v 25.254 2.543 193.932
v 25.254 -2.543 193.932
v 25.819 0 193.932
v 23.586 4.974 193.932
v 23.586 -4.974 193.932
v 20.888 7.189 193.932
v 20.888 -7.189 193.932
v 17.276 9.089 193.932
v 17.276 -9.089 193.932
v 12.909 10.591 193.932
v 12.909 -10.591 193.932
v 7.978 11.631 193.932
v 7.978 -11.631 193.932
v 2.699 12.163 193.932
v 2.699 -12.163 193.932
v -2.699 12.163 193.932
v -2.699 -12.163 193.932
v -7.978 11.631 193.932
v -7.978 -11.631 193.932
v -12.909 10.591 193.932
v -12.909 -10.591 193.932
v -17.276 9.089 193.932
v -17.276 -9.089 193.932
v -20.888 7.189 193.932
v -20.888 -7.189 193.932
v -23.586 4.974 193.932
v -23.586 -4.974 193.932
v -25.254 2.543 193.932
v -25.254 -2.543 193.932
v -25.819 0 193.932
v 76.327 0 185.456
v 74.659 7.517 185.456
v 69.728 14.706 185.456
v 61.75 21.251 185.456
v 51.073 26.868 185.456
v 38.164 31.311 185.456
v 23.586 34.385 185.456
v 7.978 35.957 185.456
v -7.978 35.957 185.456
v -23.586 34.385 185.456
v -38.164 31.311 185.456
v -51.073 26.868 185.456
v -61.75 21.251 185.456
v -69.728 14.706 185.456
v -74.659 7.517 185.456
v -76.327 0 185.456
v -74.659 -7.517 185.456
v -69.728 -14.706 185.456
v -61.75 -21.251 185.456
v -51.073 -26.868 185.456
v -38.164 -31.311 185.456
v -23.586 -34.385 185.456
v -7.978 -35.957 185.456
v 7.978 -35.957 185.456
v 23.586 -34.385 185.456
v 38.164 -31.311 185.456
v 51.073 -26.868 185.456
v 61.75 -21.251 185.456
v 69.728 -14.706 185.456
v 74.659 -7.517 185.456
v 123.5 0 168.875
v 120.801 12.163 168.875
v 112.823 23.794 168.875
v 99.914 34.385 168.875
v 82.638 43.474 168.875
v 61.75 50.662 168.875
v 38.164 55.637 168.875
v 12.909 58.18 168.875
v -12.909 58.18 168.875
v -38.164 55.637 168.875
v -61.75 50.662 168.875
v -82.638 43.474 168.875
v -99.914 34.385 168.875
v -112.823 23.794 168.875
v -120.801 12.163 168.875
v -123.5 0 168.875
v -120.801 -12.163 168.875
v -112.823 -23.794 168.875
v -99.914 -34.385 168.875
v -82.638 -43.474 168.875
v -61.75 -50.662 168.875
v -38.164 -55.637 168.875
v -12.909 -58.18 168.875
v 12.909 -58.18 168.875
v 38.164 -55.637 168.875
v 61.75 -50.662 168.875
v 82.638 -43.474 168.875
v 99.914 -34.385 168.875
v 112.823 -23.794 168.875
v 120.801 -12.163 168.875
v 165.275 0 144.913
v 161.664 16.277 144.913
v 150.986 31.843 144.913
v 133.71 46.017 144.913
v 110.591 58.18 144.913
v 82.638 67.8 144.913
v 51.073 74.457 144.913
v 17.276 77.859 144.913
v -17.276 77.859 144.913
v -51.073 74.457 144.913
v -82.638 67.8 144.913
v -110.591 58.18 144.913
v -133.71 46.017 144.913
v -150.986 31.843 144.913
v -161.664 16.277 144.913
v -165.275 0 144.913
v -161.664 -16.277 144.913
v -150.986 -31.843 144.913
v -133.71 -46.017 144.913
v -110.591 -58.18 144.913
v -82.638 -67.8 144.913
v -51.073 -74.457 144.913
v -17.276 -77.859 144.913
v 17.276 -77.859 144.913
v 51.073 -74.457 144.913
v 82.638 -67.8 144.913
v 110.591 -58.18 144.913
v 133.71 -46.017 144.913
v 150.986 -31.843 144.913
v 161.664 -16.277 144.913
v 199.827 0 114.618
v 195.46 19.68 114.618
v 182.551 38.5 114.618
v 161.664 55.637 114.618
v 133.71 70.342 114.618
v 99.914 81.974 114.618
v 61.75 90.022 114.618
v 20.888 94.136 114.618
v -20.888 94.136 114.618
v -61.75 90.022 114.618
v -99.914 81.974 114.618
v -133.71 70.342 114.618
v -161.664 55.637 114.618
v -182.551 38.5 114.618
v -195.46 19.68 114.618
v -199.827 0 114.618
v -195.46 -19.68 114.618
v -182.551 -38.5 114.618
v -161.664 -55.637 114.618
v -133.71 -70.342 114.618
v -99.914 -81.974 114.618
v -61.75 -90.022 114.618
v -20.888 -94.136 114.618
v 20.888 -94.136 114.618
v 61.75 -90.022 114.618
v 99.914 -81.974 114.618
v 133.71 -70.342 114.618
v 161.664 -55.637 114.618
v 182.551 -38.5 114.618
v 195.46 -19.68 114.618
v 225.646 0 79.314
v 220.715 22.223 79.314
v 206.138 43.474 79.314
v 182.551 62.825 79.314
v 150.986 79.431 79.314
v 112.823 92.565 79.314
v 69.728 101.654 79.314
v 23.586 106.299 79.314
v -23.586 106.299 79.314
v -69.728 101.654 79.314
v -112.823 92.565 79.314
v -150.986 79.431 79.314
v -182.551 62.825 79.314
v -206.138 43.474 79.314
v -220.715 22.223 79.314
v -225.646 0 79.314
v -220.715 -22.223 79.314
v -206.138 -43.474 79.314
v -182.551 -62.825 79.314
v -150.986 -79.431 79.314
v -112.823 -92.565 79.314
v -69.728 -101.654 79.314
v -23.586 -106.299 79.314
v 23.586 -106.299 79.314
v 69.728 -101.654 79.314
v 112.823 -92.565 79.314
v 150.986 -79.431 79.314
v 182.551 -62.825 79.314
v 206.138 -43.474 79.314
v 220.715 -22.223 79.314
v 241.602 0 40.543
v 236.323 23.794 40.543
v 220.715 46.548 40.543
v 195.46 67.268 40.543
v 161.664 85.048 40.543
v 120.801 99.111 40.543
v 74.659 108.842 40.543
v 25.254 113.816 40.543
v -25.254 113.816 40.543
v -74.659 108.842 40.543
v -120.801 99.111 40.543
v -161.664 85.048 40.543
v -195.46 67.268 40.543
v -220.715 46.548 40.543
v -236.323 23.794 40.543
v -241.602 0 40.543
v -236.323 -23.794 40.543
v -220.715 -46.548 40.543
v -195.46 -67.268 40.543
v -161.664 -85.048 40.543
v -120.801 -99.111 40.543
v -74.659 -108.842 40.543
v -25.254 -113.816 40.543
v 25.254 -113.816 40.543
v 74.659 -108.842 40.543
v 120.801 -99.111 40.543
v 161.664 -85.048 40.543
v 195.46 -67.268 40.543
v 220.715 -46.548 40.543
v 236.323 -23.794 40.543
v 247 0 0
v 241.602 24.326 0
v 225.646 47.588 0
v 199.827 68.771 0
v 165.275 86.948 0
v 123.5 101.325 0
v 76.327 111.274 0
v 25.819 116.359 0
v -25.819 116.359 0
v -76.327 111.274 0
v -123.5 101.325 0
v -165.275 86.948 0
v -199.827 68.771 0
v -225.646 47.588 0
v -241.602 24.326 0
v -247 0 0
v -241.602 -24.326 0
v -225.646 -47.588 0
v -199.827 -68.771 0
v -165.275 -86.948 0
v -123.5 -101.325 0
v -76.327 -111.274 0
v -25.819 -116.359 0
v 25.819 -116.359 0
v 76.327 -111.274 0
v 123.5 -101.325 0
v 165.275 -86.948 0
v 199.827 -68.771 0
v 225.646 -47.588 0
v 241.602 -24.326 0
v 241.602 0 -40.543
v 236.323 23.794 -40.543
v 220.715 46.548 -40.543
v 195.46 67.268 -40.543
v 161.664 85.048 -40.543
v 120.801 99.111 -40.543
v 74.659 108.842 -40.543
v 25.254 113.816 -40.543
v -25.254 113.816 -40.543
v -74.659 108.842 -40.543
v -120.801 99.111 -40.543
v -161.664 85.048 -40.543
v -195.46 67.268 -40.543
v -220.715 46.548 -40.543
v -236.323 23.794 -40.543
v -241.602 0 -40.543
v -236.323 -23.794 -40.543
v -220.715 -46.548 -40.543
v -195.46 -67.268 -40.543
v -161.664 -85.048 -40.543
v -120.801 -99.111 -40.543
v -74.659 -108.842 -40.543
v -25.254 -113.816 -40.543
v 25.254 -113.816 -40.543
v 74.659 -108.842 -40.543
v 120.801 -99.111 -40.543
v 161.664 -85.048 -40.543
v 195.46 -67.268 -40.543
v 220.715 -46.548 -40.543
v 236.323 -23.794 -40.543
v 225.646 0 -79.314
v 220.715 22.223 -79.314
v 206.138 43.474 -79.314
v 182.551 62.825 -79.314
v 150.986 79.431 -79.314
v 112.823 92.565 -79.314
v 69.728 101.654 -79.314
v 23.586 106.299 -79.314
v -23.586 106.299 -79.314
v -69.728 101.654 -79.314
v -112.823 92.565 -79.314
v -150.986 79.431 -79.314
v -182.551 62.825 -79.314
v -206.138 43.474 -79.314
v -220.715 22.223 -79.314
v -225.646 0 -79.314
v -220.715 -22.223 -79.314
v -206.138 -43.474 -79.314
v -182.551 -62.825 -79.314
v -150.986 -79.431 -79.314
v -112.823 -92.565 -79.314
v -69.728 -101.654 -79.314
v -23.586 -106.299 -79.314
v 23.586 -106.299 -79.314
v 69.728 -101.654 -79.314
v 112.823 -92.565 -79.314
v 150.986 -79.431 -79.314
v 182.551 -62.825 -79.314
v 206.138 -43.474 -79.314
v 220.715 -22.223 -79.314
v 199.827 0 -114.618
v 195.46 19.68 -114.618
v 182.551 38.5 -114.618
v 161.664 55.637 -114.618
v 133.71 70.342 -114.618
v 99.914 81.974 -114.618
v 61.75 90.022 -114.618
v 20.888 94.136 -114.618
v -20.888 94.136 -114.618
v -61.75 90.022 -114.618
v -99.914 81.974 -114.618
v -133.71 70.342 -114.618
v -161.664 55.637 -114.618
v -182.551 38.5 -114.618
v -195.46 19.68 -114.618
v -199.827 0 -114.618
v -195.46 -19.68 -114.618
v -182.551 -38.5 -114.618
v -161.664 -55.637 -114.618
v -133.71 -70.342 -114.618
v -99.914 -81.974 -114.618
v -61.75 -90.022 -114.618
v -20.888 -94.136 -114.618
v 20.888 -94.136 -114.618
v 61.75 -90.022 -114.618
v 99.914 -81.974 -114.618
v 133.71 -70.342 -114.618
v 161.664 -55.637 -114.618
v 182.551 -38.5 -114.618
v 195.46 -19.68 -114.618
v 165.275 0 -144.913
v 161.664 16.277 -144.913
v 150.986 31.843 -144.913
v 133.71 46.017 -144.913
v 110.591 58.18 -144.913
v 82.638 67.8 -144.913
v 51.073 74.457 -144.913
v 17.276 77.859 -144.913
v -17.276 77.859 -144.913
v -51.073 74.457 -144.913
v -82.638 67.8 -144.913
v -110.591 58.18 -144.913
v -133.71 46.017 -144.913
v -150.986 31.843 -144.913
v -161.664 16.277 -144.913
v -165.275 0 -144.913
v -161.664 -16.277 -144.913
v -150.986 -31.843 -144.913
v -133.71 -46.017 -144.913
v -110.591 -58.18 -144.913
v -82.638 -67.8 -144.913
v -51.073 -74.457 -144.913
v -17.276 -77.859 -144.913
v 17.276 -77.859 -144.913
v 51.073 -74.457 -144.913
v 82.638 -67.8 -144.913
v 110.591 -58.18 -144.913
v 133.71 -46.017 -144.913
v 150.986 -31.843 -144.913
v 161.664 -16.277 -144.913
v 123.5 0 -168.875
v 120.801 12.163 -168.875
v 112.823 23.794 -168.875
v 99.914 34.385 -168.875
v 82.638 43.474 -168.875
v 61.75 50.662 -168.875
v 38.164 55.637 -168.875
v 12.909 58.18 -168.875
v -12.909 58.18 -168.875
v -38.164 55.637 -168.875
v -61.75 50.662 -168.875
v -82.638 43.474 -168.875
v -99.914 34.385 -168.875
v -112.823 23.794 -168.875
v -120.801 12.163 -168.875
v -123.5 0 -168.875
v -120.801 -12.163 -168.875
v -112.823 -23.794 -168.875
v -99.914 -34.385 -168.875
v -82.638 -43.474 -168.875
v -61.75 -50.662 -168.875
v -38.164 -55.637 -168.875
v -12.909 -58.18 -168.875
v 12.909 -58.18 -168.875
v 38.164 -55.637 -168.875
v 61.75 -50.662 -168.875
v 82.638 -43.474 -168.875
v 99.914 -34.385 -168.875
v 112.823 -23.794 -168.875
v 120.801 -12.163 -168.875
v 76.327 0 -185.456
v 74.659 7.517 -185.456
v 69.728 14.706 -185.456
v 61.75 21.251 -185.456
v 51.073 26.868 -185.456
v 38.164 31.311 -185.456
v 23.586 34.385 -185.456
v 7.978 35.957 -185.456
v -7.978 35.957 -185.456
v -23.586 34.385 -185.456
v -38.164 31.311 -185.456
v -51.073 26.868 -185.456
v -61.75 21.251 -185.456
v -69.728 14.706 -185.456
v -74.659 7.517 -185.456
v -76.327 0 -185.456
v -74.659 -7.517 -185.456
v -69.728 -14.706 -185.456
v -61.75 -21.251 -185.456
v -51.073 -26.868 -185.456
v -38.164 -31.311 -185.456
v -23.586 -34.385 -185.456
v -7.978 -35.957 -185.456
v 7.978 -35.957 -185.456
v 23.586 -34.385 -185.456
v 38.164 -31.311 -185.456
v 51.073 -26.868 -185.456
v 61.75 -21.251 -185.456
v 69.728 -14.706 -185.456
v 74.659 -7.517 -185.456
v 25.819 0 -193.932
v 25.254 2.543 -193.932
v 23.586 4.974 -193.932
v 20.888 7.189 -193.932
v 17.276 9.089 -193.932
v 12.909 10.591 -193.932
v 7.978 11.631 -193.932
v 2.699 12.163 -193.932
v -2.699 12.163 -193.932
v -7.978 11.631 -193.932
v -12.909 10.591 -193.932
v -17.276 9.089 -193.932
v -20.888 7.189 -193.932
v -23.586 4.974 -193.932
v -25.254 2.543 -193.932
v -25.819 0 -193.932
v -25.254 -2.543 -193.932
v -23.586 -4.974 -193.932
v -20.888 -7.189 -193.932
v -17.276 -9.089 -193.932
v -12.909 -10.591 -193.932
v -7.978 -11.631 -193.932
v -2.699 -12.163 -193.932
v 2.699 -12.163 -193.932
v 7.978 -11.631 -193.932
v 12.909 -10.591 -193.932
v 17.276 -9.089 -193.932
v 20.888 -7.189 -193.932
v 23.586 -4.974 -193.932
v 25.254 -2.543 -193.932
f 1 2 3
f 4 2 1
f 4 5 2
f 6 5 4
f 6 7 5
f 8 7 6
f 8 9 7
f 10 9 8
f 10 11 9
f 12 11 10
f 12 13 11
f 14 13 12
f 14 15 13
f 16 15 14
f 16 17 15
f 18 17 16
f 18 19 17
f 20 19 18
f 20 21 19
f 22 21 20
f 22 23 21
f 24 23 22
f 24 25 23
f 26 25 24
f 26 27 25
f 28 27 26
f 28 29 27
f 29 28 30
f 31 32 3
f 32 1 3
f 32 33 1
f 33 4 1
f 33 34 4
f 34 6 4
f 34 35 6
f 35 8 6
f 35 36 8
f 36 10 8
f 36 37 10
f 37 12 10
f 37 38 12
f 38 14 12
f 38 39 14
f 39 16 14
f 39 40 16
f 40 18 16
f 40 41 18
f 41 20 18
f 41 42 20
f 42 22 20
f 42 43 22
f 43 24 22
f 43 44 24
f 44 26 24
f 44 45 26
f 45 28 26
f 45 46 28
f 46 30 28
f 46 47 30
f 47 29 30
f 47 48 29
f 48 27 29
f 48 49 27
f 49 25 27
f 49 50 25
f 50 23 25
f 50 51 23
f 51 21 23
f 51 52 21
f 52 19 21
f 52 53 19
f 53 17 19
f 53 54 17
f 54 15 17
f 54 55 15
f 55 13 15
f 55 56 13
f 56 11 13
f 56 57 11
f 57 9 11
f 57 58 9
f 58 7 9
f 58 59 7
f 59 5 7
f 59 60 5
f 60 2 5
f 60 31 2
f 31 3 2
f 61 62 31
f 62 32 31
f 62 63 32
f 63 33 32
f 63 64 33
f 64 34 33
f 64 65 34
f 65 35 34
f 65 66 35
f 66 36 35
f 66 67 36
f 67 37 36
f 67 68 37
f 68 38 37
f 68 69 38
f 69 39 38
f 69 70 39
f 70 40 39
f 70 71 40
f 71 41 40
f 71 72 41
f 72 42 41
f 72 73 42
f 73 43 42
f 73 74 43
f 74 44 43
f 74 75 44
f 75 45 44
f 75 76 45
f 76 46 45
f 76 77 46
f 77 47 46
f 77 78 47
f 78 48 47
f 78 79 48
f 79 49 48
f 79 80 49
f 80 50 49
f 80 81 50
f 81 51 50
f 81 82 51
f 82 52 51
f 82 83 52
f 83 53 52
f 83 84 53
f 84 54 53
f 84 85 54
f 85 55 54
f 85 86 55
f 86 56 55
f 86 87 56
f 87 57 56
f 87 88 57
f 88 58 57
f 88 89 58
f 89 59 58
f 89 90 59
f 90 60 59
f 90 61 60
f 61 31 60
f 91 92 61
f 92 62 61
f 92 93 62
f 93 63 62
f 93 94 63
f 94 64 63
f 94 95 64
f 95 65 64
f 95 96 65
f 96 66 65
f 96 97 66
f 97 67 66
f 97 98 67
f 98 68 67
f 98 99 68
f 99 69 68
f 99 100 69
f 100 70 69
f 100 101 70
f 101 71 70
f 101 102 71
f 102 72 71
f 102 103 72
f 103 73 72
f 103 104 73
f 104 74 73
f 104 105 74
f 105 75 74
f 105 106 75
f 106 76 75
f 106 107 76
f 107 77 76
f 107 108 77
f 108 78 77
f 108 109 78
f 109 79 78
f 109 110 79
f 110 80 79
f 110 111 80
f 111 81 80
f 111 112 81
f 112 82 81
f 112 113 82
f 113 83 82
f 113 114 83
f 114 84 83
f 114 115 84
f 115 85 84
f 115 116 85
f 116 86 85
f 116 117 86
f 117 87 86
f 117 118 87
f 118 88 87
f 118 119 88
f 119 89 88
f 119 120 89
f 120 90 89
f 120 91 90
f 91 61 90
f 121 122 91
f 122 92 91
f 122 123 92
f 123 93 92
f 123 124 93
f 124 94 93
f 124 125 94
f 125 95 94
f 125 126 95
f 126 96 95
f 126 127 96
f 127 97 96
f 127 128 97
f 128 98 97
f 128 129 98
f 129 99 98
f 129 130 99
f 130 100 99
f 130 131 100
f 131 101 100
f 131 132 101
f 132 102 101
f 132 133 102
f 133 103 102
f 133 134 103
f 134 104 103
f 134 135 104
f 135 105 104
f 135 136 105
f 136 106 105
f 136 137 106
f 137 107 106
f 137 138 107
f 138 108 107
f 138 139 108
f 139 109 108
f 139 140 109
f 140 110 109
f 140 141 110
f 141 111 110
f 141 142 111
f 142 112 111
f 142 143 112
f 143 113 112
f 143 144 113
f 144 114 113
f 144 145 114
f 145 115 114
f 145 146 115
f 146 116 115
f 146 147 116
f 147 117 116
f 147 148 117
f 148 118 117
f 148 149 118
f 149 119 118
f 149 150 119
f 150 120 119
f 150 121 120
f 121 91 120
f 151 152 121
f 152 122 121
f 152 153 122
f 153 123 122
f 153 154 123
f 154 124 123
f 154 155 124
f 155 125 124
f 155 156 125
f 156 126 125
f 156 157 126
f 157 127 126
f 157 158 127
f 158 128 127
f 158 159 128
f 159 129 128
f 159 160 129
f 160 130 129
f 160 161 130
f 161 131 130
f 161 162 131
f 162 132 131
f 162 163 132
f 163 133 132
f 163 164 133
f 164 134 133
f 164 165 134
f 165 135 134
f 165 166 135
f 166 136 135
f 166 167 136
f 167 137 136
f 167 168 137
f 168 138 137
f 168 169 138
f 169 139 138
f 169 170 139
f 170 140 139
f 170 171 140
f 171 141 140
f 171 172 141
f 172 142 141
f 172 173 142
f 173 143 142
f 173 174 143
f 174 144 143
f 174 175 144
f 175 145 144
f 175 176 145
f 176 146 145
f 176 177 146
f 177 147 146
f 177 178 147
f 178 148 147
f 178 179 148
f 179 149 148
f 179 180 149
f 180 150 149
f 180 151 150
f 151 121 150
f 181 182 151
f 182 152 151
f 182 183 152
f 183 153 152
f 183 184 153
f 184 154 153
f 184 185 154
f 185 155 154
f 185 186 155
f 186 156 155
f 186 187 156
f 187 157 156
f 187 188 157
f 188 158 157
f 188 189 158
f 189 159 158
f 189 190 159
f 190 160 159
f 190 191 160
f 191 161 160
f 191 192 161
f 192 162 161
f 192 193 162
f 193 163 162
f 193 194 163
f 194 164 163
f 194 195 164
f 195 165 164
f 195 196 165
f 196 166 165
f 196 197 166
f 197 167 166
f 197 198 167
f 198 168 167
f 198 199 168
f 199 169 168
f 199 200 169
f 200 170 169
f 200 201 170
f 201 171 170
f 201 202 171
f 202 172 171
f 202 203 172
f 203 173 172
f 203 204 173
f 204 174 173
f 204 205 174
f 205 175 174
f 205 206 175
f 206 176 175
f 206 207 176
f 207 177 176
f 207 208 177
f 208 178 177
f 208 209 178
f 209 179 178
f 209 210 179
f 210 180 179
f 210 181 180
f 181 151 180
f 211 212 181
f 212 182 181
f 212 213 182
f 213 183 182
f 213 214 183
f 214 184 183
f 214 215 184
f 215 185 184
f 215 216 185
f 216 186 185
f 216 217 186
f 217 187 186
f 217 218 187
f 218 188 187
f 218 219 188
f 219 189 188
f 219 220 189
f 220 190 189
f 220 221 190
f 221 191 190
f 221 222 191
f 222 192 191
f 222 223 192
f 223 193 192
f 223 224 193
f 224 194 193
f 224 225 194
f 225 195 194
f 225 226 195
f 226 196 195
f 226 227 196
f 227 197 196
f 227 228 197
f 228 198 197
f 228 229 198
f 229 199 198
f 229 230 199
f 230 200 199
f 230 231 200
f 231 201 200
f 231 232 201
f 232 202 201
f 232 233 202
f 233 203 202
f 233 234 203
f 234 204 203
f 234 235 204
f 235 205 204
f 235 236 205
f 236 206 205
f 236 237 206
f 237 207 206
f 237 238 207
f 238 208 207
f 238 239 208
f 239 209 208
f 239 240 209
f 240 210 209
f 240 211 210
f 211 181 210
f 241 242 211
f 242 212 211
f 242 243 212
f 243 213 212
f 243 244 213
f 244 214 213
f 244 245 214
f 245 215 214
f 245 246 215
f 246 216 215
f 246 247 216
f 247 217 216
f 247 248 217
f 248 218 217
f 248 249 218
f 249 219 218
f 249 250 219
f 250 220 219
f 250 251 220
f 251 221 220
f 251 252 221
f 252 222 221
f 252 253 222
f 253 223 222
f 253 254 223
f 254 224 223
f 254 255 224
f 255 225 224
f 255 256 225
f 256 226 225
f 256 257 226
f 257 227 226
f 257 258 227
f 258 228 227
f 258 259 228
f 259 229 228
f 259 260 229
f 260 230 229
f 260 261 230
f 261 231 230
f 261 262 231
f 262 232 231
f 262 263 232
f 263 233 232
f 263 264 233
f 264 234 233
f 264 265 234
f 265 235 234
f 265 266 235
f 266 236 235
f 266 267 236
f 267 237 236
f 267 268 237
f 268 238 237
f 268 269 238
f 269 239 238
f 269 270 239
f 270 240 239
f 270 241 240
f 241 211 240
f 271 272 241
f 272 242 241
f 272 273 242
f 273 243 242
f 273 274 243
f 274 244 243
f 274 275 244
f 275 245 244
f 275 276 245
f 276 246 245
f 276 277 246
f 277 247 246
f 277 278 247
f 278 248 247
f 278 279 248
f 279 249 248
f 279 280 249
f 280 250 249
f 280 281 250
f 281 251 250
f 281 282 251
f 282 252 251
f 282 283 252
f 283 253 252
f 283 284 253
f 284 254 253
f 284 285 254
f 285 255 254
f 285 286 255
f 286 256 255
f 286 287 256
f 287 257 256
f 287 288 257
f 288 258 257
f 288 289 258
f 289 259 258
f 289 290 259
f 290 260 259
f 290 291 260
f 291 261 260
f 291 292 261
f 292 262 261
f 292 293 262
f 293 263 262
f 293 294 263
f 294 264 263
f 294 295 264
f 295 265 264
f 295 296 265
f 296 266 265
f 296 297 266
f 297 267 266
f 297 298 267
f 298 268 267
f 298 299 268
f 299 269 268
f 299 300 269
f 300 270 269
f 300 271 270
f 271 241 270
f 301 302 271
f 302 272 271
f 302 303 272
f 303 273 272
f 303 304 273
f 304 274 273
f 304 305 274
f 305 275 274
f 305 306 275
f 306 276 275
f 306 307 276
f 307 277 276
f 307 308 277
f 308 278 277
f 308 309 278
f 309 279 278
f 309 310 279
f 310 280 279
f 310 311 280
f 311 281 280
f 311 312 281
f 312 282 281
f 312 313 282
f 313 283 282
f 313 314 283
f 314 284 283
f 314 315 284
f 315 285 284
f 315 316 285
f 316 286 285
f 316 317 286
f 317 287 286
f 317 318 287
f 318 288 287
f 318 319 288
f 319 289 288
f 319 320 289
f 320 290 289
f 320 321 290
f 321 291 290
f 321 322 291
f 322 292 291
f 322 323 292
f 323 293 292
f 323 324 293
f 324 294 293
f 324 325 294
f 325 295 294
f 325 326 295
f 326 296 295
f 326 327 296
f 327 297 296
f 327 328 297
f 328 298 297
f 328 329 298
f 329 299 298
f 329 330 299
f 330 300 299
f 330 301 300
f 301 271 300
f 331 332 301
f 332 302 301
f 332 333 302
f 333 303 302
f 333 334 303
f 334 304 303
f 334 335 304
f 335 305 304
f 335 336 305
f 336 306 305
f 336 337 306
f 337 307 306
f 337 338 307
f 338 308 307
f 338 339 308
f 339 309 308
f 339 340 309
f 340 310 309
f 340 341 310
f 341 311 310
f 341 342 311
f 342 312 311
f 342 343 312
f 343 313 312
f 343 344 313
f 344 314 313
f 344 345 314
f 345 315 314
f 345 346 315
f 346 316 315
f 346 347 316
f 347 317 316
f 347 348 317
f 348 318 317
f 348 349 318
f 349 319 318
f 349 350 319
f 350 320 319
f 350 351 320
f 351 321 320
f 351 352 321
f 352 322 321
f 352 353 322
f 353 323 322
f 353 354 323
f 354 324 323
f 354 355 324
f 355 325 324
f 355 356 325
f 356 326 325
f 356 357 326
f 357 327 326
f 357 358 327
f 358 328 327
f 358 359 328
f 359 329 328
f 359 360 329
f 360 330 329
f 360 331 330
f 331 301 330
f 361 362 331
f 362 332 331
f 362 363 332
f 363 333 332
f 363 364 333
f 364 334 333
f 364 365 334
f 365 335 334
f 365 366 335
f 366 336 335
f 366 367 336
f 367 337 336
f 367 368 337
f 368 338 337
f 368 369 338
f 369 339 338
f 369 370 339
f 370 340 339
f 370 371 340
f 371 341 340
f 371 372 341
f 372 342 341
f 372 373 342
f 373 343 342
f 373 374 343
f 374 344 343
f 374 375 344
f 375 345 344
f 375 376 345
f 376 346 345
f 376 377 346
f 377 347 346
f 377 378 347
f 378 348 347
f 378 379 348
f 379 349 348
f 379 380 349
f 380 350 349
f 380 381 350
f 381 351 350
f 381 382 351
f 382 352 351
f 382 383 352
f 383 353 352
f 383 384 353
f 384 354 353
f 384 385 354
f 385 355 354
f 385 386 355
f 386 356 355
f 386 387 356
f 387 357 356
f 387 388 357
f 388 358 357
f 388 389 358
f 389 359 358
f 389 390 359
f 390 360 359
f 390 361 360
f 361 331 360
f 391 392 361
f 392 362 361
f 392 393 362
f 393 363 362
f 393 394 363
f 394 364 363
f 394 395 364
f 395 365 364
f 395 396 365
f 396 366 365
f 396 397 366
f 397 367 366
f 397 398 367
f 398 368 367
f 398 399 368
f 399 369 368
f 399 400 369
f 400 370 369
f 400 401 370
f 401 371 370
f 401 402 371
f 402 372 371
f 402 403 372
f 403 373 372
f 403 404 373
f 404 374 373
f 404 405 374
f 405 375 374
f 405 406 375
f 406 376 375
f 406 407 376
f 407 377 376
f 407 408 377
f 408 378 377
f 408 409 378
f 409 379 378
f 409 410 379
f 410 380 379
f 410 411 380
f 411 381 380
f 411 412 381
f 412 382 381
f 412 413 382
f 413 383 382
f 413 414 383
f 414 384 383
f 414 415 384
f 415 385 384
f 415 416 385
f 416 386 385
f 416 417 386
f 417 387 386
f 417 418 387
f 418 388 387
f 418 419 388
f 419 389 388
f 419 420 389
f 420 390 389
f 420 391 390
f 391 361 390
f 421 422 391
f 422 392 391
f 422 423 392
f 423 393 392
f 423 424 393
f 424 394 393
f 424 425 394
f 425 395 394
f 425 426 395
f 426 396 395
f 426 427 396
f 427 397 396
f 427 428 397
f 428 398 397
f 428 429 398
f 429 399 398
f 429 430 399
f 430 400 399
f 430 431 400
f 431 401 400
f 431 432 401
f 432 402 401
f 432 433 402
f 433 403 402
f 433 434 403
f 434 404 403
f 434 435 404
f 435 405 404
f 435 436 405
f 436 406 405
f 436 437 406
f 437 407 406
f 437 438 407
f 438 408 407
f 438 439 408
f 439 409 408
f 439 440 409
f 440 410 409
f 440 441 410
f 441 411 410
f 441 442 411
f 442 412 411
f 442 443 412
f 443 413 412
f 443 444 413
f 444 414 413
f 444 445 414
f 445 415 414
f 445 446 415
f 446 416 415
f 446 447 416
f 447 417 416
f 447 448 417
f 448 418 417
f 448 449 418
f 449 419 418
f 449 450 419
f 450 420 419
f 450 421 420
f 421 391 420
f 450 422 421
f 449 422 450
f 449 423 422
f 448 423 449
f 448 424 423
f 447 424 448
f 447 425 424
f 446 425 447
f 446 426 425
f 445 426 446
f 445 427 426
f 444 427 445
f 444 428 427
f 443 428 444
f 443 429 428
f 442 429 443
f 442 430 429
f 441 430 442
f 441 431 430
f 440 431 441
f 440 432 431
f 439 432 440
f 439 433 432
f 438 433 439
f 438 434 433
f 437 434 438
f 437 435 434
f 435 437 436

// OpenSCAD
// Generated by SolidPython 1.0.1 on 2020-07-29 00:46:54


scale(v = [19, 9, 15]) {
	sphere(r = 13);
}
/***********************************************
*********      SolidPython code:      **********
************************************************
 
# import packages: SolidPython
from solid import *
from solid.utils import *
from itertools import chain, combinations, permutations


class Resize:

    def __init__(self, scad_file):
        self.scad_file = scad_file
        #self.scad_file = import_scad(scad_file)
        # cone/cylinder param:
        self.r1 = 0
        self.r2 = 0
        self.h = 0
        # rectangular prism param:
        self.w = 0
        self.l = 0
        # ellipse param:
        self.r = 0

    # import OpenScad code (file name corresponds to shape)


    # classify shape + parameters
    def assign(self, param1, param2, param3):
        if self.scad_file == 'cone.scad':
            self.r1 = param1
            self.r2 = param2
            self.h = param3
        elif self.scad_file == 'cylinder.scad':
            self.r1 = param1
            self.r2 = param2
            self.h = param3
        elif self.scad_file == 'rectangularPrism.scad':
            self.h = param1
            self.l = param2
            self.w = param3
        else:
            self.r = param1
            self.h = param2

    # resize parameters
    def iterate(self):
        x = range(3, 20, 2)
        i = 1
        if self.scad_file == 'cone.scad':
            tempList = list(permutations(x, 2))
            for temp in tempList:
                param1 = temp[0]
                param2 = temp[1]
                filepath = 'produced_scad_files/' + 'cone' + str(param1) + '_' + str(param2) + '_' + '.scad'
                scad_render_to_file(cylinder(h=param1, r1=param2, r2=0), filepath)

        elif self.scad_file == 'cylinder.scad':
            tempList = list(permutations(x, 3))
            for temp in tempList:
                param1 = temp[0]
                param2 = temp[1]
                filepath = 'produced_scad_files/' + 'cylinder' + str(param1) + '_' + str(param2) + '_' + '.scad'
                scad_render_to_file(cylinder(h=param1, r1=param2, r2=param2), filepath)

        elif self.scad_file == 'rectangularPrism.scad':
            tempList = list(permutations(x, 3))
            for temp in tempList:
                param1 = temp[0]
                param2 = temp[1]
                param3 = temp[2]
                filepath = 'produced_scad_files/' + 'rectangularPrism' + str(param1) + '_' + str(param2) + '_' + str(
                    param3) + '.scad'
                scad_render_to_file(cube(size=(param1, param2, param3)), filepath)

        elif self.scad_file == 'ellipse.scad':
            tempList = list(permutations(x, 4))
            for temp in tempList:
                param1 = temp[0]
                param2 = temp[1]
                param3 = temp[2]
                param4 = temp[3]
                filepath = 'produced_scad_files/' + 'ellipse' + str(param1) + '_' + str(param2) + '_' + str(param3) + '_' + str(param4) + '.scad'
                scad_render_to_file(scale([param1, param2, param3])(sphere(r=param4)), filepath)

    def render_to_scadfile(self):
        scad_render_to_file(scad, 'example.scad') 
 
************************************************/
